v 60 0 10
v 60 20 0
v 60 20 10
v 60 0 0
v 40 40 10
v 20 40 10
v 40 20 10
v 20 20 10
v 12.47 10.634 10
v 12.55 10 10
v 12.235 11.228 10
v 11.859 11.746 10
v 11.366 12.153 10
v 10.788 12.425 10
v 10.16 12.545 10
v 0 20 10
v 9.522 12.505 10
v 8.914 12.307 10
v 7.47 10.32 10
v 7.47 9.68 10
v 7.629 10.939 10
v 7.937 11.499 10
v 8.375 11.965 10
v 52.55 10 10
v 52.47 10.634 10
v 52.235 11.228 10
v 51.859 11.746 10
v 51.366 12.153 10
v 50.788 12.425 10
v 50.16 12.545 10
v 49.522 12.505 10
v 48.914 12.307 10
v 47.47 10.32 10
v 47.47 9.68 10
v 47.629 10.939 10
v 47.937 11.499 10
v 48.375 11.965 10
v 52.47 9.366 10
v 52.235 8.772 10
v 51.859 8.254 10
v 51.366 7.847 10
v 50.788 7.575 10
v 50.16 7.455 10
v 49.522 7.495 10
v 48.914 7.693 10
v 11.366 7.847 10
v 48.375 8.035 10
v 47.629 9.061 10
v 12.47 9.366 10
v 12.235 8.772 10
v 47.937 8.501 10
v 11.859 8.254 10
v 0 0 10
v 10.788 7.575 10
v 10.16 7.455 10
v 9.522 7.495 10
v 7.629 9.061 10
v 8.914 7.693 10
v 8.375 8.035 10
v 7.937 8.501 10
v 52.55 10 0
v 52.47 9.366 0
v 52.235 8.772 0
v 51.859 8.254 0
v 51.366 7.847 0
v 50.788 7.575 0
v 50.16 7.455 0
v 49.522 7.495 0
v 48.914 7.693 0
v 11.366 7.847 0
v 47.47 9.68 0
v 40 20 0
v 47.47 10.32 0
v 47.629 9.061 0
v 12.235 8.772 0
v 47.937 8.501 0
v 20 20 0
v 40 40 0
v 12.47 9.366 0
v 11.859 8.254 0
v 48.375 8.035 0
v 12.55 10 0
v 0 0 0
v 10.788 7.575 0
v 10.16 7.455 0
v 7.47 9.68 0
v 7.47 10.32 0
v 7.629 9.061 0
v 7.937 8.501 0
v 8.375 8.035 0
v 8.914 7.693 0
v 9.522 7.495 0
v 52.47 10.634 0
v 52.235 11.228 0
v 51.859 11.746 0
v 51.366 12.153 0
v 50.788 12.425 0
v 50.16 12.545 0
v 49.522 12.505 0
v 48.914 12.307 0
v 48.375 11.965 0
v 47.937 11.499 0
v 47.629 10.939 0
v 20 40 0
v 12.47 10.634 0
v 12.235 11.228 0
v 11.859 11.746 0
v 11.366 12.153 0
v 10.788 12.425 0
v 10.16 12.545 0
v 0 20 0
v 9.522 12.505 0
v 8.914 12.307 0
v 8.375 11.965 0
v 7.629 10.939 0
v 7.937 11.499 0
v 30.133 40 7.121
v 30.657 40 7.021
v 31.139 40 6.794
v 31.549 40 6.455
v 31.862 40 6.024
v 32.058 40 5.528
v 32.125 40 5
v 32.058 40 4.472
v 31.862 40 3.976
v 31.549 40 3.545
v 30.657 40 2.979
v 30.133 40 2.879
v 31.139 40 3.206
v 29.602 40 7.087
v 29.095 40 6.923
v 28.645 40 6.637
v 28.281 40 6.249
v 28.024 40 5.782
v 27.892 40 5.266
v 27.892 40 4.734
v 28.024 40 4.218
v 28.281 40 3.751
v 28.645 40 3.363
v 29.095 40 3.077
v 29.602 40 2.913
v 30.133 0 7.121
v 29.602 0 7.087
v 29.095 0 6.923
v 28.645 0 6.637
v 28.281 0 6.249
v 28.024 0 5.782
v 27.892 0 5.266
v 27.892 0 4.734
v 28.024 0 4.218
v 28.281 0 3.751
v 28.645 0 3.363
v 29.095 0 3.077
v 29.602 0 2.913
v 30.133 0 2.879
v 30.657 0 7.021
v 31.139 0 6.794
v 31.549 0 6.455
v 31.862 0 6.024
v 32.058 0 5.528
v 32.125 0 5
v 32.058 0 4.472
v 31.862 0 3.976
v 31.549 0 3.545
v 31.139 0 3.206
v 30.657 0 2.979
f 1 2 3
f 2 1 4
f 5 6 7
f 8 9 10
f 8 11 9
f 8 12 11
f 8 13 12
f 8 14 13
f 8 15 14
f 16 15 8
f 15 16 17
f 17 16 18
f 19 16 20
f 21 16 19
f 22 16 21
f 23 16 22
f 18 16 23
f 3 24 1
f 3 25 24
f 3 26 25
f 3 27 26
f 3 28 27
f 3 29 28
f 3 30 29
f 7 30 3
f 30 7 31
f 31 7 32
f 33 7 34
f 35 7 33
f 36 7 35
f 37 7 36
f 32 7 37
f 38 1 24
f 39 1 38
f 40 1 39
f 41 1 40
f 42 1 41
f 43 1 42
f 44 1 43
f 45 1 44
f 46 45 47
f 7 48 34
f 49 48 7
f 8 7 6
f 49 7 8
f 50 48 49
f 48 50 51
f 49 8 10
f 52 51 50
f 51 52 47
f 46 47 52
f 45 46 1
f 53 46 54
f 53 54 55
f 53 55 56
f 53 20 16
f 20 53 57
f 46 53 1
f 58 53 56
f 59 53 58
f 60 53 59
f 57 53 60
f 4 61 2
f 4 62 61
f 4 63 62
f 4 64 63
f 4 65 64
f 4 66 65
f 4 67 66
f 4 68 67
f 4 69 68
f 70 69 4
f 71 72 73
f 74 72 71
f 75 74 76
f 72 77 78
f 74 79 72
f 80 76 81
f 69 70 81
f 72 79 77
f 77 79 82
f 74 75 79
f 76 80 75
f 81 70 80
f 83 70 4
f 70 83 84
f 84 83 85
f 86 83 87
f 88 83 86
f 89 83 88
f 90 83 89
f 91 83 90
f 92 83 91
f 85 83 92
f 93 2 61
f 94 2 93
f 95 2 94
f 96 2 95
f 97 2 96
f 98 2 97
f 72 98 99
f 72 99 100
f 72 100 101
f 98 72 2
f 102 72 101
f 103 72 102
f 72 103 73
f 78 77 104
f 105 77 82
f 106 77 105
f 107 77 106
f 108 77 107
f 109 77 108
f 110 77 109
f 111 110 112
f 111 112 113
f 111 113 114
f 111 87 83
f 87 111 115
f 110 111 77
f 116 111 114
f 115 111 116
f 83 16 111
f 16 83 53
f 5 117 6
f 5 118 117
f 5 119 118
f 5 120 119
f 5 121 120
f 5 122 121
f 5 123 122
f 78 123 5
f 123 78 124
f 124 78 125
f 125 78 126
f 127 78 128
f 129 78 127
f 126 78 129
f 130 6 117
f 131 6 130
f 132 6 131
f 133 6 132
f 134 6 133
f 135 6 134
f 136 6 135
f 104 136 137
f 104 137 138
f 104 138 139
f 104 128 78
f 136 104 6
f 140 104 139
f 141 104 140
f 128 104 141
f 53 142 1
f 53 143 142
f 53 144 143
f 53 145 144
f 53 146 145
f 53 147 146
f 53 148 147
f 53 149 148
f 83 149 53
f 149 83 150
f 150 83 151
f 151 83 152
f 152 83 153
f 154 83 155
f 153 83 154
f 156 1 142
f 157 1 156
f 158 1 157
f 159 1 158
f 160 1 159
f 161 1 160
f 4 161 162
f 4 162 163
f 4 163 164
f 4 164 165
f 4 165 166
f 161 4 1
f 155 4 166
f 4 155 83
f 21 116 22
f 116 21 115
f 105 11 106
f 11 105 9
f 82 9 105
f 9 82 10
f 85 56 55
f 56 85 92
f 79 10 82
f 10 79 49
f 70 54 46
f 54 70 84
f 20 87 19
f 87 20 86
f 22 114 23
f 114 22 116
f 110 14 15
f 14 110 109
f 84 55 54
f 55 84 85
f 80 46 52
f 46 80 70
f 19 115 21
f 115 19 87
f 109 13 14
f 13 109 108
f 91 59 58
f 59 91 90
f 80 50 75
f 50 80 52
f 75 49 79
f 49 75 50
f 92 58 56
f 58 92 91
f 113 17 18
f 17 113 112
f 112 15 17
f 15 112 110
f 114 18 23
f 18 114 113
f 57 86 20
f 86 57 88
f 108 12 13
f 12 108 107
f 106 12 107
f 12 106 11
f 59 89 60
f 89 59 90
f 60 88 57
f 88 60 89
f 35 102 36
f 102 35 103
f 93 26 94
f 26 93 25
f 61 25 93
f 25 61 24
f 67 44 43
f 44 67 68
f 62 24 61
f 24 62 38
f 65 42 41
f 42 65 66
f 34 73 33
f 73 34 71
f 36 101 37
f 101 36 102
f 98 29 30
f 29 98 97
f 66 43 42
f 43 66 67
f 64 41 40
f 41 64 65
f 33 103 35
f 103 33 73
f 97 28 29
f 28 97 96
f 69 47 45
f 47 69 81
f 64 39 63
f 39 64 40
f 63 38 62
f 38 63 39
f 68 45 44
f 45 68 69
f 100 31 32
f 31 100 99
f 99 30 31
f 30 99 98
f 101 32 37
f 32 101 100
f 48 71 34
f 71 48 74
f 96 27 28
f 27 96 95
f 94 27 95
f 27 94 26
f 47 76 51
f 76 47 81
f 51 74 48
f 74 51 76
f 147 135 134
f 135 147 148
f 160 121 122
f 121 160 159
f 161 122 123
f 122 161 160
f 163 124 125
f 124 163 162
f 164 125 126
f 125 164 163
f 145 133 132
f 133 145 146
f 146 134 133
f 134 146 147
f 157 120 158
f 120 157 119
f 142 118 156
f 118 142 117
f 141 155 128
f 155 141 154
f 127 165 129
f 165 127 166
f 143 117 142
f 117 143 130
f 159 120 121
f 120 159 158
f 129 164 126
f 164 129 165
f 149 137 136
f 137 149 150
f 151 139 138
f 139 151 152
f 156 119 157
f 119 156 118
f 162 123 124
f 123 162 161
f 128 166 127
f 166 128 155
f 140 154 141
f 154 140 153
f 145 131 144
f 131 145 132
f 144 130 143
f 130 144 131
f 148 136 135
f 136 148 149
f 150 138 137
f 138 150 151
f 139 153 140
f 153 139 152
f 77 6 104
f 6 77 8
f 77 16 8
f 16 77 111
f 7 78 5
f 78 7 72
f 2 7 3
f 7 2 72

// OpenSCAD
difference(){
    cube([60,40,10]);
    
    translate([10,10, 0]) cylinder(d=5.1, h=10, $fn=25);
    translate([50,10, 0]) cylinder(d=5.1, h=10, $fn=25);
    translate([30,40,5]) rotate([90,0,0]) cylinder(d=4.25, h=40, $fn=25);
    
    translate([0,20,0]) cube([20,20,10]);
    translate([40,20,0]) cube([20,20,10]);
}
